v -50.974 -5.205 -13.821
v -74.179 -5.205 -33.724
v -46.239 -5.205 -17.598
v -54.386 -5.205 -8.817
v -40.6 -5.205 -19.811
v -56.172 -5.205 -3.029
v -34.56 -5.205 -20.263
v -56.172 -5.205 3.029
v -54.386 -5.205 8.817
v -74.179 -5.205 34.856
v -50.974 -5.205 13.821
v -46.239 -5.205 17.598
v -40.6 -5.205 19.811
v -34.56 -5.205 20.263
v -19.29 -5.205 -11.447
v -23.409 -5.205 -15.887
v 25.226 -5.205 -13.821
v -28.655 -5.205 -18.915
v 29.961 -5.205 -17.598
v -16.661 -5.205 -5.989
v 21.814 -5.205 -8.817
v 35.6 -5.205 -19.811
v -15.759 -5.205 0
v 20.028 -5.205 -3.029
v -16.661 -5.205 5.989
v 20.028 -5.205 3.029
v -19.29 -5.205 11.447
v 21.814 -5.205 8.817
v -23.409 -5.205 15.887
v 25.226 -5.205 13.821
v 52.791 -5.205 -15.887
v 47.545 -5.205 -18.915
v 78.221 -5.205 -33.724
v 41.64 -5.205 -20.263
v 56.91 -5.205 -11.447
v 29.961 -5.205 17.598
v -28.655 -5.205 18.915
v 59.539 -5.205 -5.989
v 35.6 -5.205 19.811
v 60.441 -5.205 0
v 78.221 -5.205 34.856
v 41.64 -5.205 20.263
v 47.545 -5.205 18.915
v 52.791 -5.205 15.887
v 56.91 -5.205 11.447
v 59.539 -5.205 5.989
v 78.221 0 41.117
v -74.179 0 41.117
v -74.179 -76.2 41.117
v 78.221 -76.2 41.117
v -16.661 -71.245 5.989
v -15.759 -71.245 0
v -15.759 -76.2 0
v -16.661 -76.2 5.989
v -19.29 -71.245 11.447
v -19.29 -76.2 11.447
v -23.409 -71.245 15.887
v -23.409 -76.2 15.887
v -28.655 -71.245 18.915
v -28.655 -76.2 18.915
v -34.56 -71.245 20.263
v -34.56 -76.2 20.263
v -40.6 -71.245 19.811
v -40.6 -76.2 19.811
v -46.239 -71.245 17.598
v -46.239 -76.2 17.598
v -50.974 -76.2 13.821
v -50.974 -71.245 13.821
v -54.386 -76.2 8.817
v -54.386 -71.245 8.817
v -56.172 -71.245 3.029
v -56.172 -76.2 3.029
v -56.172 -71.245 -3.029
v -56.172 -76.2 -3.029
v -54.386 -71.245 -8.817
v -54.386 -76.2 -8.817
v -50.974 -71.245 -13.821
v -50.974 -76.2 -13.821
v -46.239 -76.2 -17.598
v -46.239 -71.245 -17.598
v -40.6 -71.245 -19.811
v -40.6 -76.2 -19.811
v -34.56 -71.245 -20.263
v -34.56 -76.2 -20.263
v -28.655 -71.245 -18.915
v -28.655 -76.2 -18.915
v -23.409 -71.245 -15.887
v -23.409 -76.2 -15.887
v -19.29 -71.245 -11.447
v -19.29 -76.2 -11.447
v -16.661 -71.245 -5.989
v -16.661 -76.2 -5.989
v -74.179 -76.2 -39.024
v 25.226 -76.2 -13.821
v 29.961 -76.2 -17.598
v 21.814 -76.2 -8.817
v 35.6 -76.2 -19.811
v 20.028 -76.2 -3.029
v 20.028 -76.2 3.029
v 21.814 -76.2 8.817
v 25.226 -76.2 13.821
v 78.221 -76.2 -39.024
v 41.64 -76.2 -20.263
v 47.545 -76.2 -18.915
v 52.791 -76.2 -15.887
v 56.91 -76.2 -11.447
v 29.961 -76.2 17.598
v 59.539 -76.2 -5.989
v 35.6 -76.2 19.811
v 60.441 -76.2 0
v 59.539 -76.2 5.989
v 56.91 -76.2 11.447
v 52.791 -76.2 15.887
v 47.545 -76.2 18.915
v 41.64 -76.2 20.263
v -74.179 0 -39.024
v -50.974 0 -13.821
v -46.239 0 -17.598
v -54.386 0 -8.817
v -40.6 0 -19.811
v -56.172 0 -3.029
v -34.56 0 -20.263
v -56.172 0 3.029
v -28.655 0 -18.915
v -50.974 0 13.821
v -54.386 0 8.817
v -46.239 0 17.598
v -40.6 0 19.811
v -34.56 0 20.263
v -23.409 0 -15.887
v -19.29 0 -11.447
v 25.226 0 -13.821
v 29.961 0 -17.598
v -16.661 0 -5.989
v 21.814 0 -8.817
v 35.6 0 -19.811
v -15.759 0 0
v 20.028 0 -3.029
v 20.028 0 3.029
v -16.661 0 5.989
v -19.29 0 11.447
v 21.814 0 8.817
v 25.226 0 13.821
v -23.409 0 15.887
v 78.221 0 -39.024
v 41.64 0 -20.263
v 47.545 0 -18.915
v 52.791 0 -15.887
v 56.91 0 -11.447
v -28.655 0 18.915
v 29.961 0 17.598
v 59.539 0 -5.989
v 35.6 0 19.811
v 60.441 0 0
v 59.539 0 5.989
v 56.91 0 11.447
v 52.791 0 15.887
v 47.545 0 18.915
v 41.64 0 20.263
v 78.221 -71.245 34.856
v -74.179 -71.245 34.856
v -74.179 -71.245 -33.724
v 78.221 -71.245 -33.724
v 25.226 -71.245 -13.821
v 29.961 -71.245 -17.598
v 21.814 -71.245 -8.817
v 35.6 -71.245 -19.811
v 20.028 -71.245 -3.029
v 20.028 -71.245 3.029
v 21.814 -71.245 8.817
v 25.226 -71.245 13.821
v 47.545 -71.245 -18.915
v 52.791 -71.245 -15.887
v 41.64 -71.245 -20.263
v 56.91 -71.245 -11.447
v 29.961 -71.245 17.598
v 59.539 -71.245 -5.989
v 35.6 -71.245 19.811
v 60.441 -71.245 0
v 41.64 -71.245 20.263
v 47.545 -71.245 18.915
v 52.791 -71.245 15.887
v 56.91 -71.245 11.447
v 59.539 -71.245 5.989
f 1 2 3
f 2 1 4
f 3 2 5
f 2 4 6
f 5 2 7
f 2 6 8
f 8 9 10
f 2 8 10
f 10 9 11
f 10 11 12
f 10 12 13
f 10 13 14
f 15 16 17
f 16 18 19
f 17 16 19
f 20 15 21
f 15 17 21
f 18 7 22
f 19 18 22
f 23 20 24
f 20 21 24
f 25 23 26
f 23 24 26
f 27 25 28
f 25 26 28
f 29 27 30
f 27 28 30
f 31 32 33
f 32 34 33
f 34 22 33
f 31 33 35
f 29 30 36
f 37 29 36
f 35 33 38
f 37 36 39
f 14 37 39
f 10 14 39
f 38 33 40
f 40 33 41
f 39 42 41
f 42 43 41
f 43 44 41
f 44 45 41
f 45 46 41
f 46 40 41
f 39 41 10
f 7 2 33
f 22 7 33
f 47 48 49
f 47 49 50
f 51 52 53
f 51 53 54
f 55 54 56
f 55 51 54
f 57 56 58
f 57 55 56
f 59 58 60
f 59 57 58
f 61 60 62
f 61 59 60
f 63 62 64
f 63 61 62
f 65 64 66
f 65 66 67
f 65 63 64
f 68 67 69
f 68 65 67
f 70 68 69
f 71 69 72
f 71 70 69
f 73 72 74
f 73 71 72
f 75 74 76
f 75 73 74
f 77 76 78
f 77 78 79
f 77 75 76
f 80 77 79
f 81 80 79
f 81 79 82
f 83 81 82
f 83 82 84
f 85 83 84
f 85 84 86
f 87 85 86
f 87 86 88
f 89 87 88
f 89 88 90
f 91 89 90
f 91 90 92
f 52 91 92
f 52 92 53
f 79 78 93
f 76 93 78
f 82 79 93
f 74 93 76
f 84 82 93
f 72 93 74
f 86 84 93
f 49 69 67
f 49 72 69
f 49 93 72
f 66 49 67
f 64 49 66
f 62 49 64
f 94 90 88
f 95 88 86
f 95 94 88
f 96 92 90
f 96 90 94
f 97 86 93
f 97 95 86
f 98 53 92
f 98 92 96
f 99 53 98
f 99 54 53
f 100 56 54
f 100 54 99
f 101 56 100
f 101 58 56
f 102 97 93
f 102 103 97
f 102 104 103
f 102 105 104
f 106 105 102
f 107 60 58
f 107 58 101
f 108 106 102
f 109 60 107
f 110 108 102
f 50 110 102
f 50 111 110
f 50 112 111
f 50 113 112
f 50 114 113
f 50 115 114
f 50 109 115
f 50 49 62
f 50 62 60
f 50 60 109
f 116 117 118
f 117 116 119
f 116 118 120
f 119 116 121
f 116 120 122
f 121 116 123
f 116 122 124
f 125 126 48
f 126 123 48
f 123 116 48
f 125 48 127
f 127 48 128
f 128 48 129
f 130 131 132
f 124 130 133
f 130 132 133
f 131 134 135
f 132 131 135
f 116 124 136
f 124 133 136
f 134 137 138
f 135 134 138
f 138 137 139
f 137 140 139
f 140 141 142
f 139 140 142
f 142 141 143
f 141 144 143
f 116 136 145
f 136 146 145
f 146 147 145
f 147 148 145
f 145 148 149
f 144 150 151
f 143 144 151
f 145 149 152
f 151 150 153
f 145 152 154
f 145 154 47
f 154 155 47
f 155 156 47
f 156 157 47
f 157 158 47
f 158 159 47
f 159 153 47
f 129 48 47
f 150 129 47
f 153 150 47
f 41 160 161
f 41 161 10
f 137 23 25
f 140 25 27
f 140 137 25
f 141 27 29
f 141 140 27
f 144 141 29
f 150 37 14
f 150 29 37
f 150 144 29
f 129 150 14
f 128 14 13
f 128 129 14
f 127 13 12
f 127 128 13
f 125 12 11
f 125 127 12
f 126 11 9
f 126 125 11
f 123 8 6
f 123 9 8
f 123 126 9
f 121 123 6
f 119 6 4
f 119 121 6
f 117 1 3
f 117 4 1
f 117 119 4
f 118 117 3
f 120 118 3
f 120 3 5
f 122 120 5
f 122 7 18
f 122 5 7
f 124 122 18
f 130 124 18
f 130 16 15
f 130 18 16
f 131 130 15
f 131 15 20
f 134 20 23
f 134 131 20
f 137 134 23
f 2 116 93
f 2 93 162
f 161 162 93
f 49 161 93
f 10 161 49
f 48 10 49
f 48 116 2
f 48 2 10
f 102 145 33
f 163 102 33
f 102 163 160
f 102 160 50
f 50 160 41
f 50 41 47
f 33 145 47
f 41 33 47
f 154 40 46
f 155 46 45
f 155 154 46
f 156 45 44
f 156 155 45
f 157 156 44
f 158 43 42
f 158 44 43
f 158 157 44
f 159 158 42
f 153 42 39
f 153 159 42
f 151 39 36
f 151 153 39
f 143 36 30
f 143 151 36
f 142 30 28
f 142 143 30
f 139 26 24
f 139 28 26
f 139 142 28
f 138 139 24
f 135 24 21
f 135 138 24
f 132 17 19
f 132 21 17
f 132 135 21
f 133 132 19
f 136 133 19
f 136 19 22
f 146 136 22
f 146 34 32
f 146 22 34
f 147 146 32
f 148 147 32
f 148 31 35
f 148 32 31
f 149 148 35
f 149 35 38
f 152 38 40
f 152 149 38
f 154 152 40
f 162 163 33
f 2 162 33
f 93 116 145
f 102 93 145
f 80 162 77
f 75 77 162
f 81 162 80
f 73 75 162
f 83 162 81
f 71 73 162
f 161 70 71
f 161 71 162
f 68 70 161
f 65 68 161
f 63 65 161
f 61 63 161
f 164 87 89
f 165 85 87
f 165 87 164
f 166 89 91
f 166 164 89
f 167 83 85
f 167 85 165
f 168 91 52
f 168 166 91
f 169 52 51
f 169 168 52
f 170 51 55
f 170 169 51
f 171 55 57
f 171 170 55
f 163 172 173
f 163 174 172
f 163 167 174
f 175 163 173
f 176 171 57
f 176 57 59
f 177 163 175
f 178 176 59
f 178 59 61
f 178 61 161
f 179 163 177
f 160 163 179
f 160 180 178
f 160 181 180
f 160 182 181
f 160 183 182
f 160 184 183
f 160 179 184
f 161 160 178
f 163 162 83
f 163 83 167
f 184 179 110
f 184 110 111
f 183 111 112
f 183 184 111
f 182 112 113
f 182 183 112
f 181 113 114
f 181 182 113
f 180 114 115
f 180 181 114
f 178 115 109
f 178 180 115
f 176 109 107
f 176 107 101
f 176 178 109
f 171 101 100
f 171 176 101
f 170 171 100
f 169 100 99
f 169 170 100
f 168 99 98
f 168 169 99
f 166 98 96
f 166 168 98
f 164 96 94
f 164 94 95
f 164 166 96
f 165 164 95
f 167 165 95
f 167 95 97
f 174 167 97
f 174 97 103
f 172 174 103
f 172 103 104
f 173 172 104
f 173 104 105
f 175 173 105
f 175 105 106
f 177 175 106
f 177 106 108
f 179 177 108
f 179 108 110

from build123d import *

# Parameters (mm, degrees)
F0_W     = 152.4
F0_H     = 80.1413774056
F0_R     = 20.32
F1_DEPTH = 76.2
F2_W     = 66.04
F2_H     = 68.58
F4_DEPTH = 203.2
F5_DEPTH = 203.2
F6_W     = 77.2189535201
F6_H     = 20.4676762223
F7_DEPTH = 25.4


# Not quite as in the source:
# - the program builds the solid bodies; features that only make, move or delete a surface that nothing else refers to are left out


with BuildPart() as f1:
    # F0 (on Front) → F1 (new body)
    with BuildSketch(Plane.XZ):
        with Locations((2.0212908328, 1.0466417298)):
            Rectangle(F0_W, F0_H)
        with Locations((-36.0787091672, 0)):
            Circle(F0_R, mode=Mode.SUBTRACT)
        with Locations((40.1212908328, 0)):
            Circle(F0_R, mode=Mode.SUBTRACT)
    extrude(amount=F1_DEPTH)

    # F2 (on Right) → F4 (cut)
    with BuildSketch(Plane.YZ):
        with Locations((-38.2246004883, 0.5660843734)):
            Rectangle(F2_W, F2_H)
    extrude(amount=-F4_DEPTH, mode=Mode.SUBTRACT)

    # F5 (cut): a face of the model
    f5_faces = [f1.faces().sort_by_distance(p)[0] for p in [
        (0, -38.2246004883, 0.5660843734),
    ]]
    extrude(f5_faces, amount=-F5_DEPTH, mode=Mode.SUBTRACT)

    # F6 (on Top) → F7 (cut)
    with BuildSketch(Plane.XY):
        with Locations((2.0572859794, -37.5628359616)):
            Rectangle(F6_W, F6_H)
    extrude(amount=-F7_DEPTH, mode=Mode.SUBTRACT)


solid = f1.part
